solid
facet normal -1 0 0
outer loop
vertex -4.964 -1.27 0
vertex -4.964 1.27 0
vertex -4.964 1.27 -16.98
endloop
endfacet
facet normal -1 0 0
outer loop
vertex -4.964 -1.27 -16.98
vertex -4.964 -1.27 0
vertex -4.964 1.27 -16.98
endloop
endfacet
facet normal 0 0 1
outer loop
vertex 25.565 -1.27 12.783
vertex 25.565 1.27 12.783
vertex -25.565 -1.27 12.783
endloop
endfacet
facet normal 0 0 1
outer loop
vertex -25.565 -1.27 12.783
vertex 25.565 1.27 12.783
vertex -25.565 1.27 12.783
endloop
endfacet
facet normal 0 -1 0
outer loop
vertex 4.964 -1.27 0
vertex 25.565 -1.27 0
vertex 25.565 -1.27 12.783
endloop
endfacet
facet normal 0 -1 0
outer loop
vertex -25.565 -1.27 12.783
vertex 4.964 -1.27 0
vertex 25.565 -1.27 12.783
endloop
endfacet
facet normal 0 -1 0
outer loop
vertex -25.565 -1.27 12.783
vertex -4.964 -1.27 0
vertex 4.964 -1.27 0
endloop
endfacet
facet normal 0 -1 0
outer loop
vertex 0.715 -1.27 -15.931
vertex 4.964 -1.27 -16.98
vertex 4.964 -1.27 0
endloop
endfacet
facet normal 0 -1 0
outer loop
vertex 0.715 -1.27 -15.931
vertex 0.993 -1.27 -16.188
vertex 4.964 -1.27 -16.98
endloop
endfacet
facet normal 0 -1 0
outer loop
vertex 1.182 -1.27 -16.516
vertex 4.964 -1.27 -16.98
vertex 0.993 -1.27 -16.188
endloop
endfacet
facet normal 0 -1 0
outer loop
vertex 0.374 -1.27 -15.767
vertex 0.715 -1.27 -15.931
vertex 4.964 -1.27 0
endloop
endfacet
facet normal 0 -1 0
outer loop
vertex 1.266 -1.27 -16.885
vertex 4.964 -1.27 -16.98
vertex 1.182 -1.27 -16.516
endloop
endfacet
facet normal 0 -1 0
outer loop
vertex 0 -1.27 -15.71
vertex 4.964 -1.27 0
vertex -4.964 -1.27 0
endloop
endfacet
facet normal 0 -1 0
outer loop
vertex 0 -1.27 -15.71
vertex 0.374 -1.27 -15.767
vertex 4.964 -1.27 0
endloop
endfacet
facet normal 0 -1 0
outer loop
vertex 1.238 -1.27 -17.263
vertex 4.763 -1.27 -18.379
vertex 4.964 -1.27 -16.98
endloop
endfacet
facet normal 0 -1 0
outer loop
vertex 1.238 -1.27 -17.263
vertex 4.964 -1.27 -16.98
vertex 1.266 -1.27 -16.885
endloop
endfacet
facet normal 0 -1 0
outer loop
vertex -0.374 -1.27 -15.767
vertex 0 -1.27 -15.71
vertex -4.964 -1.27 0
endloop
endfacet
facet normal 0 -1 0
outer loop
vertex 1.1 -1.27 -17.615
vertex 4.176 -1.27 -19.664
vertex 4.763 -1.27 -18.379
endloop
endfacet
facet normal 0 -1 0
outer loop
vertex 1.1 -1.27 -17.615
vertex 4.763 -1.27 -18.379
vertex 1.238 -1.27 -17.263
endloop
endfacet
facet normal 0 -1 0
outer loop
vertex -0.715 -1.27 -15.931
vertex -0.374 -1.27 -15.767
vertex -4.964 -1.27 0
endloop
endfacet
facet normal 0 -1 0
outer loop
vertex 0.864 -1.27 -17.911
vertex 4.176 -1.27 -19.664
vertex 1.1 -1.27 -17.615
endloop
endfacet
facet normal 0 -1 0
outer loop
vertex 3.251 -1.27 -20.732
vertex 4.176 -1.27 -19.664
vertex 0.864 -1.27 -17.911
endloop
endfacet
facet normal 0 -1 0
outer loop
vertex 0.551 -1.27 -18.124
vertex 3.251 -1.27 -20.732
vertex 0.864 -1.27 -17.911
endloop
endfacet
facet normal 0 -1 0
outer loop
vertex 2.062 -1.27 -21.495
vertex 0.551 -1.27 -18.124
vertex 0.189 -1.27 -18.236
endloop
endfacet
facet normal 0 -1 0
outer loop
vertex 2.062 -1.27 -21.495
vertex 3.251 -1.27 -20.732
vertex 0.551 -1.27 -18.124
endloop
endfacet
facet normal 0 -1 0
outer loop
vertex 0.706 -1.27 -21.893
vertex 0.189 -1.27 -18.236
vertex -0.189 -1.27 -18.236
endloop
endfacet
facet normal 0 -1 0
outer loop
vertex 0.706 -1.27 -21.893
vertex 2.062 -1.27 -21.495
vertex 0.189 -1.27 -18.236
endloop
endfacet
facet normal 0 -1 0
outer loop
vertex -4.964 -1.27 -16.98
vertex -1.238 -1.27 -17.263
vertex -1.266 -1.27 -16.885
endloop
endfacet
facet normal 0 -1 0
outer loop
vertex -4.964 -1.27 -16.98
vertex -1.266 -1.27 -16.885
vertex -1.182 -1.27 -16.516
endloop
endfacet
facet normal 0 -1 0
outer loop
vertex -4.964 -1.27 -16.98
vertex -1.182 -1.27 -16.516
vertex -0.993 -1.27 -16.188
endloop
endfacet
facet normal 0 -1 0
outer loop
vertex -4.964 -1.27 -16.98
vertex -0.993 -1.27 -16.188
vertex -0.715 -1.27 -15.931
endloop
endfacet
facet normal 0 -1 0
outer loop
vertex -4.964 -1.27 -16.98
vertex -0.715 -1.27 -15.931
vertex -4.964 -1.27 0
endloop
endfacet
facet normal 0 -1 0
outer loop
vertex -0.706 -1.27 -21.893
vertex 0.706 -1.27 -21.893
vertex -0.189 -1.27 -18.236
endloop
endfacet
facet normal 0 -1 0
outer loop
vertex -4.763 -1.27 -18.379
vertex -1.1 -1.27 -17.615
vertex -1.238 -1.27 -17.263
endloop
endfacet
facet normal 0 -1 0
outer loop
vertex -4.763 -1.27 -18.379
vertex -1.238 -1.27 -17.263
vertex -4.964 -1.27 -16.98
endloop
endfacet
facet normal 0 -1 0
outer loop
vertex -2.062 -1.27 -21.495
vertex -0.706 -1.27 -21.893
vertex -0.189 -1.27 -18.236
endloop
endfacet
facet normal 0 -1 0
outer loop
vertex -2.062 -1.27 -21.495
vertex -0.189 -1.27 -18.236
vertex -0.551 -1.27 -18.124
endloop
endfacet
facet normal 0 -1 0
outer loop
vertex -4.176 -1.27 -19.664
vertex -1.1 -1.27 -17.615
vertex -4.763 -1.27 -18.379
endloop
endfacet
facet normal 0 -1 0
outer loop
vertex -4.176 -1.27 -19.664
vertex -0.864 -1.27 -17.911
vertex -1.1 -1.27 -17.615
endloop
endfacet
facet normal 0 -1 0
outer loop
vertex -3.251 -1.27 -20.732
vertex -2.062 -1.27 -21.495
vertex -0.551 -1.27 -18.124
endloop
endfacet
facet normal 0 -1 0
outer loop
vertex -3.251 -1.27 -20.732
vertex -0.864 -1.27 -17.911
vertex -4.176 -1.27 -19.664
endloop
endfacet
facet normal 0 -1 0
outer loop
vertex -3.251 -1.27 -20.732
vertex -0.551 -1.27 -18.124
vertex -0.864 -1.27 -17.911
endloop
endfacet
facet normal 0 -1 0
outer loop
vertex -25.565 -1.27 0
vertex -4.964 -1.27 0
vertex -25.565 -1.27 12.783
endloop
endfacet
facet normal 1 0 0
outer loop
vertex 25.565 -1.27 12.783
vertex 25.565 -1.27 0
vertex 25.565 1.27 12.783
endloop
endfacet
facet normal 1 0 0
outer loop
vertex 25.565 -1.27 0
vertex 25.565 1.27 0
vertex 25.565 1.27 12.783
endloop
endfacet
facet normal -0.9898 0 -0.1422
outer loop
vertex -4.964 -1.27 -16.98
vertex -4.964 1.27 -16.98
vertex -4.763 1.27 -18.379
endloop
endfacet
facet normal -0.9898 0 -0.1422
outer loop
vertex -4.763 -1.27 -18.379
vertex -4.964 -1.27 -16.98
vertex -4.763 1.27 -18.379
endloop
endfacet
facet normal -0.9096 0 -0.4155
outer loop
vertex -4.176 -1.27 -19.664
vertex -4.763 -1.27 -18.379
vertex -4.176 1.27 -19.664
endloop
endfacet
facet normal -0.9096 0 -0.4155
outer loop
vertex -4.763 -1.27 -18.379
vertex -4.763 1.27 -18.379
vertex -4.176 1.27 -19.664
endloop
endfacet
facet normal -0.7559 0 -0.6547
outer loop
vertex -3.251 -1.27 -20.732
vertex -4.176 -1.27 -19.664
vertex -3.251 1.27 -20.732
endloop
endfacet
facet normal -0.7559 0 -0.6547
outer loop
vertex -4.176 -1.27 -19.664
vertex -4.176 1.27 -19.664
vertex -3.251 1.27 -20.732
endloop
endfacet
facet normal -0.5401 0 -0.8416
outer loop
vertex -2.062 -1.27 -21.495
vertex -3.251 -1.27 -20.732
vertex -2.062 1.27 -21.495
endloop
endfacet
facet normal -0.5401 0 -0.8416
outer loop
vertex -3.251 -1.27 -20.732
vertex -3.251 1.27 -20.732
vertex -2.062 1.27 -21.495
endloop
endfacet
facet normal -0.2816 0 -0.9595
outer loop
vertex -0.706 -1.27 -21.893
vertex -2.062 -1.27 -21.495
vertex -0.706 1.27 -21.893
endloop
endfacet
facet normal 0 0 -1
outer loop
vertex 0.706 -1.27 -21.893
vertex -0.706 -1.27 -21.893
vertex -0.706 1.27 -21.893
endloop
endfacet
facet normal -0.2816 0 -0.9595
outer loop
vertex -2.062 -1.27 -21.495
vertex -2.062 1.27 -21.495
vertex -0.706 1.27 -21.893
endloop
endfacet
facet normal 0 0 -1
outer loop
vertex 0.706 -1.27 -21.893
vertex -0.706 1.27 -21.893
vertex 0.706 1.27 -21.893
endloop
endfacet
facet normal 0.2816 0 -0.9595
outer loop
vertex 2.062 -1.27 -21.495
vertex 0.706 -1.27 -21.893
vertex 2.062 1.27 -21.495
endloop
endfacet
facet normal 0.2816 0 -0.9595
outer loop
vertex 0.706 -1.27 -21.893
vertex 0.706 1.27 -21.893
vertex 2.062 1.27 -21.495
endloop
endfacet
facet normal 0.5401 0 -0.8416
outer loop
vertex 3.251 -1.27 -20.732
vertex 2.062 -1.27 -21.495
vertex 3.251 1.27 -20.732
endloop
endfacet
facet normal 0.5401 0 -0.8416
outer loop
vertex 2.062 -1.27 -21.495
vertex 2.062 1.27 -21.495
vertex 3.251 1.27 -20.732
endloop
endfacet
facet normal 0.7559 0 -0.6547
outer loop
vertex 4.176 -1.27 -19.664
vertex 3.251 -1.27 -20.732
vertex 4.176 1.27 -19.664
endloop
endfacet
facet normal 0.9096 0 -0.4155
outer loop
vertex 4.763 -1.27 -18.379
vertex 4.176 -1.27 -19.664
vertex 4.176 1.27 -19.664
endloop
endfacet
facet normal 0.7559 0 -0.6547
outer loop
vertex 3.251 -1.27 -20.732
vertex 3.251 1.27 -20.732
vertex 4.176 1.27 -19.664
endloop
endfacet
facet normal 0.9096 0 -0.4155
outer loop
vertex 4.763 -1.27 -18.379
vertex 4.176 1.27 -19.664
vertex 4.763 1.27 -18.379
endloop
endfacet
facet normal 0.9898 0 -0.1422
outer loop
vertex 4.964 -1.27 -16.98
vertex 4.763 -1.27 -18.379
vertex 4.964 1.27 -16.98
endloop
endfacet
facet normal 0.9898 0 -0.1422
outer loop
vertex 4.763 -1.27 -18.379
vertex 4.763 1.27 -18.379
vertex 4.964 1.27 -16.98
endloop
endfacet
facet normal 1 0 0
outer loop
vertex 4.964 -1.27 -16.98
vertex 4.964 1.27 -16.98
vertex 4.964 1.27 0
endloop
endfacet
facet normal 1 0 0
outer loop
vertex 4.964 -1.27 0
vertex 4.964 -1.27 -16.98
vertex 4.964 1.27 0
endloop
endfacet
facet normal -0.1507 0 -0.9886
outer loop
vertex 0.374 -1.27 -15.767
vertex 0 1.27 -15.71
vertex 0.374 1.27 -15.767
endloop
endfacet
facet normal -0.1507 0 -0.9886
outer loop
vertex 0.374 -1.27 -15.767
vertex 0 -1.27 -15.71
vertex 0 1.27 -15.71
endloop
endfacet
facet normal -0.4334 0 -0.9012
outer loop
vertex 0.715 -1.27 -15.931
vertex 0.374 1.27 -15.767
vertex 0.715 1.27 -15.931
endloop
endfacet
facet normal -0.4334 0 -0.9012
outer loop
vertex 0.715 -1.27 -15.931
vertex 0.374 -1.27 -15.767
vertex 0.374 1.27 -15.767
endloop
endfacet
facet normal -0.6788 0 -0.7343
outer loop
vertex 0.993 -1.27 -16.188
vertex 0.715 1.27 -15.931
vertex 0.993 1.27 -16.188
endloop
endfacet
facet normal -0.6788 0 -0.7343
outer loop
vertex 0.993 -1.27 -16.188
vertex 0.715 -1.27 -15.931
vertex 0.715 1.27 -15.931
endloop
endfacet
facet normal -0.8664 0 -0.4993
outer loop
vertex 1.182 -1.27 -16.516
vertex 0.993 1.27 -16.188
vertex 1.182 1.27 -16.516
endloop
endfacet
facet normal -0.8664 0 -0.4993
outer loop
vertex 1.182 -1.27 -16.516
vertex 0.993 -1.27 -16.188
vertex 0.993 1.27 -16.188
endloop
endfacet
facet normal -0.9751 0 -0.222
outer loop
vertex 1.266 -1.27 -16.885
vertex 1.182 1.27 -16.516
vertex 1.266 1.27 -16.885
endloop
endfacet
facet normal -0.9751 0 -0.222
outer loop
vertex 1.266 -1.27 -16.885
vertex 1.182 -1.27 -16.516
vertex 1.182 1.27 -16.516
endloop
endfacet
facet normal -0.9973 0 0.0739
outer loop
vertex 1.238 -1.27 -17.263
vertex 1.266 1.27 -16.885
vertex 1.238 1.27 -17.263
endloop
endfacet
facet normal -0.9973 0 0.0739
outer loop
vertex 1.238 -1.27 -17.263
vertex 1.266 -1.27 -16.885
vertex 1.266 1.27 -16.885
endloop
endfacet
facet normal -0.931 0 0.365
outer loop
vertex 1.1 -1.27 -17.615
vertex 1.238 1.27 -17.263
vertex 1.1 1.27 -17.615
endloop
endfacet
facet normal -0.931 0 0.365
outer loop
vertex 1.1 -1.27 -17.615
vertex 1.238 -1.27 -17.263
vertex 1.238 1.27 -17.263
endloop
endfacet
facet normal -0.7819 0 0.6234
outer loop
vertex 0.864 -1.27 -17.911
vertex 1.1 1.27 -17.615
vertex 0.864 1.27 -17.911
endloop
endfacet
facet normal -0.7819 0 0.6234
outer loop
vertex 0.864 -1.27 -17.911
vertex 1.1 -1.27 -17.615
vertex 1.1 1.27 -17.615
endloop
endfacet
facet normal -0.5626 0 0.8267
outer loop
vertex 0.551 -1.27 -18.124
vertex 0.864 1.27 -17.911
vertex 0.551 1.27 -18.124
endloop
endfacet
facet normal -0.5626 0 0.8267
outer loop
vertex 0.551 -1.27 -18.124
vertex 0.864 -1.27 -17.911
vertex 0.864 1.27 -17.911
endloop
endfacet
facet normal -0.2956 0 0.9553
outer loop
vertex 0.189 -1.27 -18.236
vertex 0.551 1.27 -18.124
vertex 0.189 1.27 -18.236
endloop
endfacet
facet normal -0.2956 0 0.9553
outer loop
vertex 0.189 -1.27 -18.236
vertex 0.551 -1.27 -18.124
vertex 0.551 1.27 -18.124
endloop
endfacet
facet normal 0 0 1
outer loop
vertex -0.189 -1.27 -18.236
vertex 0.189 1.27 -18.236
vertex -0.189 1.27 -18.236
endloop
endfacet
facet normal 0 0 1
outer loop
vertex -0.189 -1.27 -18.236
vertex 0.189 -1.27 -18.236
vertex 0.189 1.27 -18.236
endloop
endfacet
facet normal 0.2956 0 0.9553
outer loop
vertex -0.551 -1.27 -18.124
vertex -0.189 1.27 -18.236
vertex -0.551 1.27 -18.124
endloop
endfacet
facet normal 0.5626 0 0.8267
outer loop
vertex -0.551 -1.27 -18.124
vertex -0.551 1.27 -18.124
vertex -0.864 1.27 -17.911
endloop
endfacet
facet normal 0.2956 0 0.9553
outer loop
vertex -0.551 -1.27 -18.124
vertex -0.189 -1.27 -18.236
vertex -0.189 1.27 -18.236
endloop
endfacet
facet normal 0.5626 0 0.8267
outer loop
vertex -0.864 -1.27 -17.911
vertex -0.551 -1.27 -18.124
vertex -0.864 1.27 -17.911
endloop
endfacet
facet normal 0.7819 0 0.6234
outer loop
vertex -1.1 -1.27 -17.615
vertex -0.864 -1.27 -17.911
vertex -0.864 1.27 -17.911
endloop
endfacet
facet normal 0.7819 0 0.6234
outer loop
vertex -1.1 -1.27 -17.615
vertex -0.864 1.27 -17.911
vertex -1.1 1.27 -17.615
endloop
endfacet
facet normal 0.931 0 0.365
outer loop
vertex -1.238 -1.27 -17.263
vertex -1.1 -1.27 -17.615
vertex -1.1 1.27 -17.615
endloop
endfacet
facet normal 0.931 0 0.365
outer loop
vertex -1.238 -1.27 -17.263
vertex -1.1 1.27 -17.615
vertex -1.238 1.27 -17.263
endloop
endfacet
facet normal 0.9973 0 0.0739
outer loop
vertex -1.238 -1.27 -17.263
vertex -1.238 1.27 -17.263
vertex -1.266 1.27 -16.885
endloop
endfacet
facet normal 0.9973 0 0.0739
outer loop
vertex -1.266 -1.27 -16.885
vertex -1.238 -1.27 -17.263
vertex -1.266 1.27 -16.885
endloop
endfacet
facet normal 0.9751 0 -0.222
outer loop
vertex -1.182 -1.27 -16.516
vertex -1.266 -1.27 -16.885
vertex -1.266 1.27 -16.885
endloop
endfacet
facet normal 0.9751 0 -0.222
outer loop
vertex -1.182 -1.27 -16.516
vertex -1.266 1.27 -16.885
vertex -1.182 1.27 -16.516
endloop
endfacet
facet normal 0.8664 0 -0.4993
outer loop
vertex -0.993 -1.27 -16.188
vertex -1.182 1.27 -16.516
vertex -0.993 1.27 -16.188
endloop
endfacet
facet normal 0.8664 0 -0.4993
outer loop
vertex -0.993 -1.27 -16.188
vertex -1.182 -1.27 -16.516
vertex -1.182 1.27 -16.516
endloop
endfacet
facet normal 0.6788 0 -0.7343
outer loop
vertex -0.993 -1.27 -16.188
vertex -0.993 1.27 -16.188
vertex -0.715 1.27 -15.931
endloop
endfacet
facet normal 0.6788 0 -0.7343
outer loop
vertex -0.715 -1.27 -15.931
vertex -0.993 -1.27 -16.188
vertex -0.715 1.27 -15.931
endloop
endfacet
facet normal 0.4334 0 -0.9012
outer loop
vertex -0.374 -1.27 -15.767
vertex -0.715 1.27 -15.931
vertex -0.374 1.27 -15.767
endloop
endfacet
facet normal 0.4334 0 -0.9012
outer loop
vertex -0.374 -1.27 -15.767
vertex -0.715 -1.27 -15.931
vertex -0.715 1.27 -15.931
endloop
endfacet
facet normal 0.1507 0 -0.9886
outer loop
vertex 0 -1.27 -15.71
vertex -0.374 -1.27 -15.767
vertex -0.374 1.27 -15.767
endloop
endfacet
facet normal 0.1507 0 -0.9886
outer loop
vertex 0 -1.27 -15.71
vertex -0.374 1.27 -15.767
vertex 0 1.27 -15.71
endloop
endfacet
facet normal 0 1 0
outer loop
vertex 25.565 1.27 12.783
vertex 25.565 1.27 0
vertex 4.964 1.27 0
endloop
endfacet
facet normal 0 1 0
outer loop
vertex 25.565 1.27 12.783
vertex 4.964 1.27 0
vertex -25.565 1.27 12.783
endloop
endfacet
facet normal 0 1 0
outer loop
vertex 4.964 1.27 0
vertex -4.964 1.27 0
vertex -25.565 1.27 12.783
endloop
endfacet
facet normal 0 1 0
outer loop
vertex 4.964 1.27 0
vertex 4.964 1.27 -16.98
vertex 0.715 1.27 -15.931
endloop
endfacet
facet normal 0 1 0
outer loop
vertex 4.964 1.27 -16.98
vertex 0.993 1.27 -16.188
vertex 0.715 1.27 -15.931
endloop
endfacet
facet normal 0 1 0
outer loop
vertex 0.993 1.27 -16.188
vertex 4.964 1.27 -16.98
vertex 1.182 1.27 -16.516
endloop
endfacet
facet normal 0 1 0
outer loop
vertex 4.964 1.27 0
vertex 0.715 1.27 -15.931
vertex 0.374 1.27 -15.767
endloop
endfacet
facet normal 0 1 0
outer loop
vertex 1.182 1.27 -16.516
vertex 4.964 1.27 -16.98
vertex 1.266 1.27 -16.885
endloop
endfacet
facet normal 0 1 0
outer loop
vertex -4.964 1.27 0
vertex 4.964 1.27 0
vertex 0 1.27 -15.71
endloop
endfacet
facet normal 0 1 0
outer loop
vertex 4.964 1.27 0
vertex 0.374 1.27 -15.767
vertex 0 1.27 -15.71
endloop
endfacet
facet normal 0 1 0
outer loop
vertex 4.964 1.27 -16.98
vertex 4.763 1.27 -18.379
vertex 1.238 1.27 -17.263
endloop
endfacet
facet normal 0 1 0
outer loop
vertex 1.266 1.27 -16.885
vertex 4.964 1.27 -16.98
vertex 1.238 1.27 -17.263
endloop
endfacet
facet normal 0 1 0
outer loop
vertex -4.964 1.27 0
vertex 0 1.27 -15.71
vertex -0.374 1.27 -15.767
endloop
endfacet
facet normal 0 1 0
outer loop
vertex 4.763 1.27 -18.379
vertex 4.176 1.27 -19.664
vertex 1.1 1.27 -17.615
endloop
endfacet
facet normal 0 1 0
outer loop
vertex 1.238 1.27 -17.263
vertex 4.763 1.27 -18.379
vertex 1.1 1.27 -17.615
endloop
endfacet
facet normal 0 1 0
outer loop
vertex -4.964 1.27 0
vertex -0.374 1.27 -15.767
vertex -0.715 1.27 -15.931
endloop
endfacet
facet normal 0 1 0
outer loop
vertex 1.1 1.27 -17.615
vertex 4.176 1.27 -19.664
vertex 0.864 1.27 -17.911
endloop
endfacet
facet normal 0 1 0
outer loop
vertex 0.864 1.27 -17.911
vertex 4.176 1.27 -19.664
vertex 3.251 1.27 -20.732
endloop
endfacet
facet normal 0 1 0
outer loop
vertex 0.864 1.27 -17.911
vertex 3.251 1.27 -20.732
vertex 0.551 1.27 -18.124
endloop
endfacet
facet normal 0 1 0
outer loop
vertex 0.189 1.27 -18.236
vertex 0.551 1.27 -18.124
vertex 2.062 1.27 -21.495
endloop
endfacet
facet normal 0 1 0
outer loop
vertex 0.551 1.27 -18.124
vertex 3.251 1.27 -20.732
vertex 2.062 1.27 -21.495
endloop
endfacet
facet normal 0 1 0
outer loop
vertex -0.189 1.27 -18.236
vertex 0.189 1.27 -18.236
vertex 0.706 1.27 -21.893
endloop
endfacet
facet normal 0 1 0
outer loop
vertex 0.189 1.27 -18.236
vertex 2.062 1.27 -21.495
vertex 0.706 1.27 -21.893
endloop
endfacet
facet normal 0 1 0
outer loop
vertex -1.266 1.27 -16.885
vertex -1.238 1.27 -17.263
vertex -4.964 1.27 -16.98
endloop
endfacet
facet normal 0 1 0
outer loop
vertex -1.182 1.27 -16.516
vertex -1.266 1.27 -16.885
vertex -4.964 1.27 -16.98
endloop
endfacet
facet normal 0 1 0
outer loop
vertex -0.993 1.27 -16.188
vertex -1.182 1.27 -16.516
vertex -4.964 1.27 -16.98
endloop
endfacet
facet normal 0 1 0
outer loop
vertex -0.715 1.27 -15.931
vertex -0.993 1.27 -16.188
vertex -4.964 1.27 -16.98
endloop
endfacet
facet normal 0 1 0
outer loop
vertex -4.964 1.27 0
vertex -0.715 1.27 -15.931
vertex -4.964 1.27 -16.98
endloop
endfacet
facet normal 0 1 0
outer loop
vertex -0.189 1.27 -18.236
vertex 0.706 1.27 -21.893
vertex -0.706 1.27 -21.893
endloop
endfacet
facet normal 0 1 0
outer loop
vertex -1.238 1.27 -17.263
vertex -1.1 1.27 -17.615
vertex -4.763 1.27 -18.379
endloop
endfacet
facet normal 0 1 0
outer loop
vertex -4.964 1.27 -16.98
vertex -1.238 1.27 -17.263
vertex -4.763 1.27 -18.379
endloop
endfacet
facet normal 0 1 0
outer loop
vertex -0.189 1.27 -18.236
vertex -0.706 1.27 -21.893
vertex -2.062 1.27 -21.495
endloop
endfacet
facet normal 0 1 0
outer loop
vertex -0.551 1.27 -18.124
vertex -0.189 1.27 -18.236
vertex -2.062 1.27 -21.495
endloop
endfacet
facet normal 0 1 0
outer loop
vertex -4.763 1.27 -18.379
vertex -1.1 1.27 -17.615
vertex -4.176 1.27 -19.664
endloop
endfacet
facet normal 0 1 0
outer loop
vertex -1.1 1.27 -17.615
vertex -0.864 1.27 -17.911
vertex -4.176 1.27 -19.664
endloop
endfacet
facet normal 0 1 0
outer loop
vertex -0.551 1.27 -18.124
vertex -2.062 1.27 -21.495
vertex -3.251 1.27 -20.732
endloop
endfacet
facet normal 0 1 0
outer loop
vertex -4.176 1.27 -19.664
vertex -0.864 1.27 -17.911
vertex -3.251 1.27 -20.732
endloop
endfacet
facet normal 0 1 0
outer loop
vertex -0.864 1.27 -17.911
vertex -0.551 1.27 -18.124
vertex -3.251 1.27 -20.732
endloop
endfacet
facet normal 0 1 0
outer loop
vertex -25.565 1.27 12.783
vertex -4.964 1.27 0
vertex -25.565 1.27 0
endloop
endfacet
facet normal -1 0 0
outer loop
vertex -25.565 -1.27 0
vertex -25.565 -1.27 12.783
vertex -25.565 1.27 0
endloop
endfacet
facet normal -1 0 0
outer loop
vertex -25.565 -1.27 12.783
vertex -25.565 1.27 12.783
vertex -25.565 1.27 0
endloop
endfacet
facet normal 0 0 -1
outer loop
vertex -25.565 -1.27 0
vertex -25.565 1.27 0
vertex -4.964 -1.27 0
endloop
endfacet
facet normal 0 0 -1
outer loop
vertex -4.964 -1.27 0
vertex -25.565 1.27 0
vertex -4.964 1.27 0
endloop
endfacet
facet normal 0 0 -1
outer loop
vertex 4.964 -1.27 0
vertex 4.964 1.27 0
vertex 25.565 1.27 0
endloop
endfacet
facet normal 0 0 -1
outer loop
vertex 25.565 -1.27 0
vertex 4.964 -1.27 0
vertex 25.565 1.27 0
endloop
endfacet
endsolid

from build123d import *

# Parameters (mm, degrees)
SKETCH1_R           = 1.27
BOSS_EXTRUDE1_DEPTH = 1.27


with BuildPart() as part:
    # Sketch1 → Boss-Extrude1 (new, symmetric)
    with BuildSketch(Plane(origin=(0, 0, 0), x_dir=(1, 0, 0), z_dir=(0, 1, 0))):
        with BuildLine():
            Line((4.963813713, 0), (25.565066873, 0))
            Line((25.565066873, 0), (25.565066873, -12.782533436))
            Line((25.565066873, -12.782533436), (-25.565066873, -12.782533436))
            Line((-25.565066873, -12.782533436), (-25.565066873, 0))
            Line((-25.565066873, 0), (-4.963813713, 0))
            Line((-4.963813713, 0), (-4.963813713, 16.980141079))
            ThreePointArc((-4.963813713, 16.980141079), (0, 21.943954793), (4.963813713, 16.980141079))
            Line((4.963813713, 16.980141079), (4.963813713, 0))
        make_face()
        with Locations(Location((0, 16.980141079, 0), (0, 0, 270))):
            Circle(SKETCH1_R, mode=Mode.SUBTRACT)
    extrude(amount=BOSS_EXTRUDE1_DEPTH, both=True)


solid = part.part
